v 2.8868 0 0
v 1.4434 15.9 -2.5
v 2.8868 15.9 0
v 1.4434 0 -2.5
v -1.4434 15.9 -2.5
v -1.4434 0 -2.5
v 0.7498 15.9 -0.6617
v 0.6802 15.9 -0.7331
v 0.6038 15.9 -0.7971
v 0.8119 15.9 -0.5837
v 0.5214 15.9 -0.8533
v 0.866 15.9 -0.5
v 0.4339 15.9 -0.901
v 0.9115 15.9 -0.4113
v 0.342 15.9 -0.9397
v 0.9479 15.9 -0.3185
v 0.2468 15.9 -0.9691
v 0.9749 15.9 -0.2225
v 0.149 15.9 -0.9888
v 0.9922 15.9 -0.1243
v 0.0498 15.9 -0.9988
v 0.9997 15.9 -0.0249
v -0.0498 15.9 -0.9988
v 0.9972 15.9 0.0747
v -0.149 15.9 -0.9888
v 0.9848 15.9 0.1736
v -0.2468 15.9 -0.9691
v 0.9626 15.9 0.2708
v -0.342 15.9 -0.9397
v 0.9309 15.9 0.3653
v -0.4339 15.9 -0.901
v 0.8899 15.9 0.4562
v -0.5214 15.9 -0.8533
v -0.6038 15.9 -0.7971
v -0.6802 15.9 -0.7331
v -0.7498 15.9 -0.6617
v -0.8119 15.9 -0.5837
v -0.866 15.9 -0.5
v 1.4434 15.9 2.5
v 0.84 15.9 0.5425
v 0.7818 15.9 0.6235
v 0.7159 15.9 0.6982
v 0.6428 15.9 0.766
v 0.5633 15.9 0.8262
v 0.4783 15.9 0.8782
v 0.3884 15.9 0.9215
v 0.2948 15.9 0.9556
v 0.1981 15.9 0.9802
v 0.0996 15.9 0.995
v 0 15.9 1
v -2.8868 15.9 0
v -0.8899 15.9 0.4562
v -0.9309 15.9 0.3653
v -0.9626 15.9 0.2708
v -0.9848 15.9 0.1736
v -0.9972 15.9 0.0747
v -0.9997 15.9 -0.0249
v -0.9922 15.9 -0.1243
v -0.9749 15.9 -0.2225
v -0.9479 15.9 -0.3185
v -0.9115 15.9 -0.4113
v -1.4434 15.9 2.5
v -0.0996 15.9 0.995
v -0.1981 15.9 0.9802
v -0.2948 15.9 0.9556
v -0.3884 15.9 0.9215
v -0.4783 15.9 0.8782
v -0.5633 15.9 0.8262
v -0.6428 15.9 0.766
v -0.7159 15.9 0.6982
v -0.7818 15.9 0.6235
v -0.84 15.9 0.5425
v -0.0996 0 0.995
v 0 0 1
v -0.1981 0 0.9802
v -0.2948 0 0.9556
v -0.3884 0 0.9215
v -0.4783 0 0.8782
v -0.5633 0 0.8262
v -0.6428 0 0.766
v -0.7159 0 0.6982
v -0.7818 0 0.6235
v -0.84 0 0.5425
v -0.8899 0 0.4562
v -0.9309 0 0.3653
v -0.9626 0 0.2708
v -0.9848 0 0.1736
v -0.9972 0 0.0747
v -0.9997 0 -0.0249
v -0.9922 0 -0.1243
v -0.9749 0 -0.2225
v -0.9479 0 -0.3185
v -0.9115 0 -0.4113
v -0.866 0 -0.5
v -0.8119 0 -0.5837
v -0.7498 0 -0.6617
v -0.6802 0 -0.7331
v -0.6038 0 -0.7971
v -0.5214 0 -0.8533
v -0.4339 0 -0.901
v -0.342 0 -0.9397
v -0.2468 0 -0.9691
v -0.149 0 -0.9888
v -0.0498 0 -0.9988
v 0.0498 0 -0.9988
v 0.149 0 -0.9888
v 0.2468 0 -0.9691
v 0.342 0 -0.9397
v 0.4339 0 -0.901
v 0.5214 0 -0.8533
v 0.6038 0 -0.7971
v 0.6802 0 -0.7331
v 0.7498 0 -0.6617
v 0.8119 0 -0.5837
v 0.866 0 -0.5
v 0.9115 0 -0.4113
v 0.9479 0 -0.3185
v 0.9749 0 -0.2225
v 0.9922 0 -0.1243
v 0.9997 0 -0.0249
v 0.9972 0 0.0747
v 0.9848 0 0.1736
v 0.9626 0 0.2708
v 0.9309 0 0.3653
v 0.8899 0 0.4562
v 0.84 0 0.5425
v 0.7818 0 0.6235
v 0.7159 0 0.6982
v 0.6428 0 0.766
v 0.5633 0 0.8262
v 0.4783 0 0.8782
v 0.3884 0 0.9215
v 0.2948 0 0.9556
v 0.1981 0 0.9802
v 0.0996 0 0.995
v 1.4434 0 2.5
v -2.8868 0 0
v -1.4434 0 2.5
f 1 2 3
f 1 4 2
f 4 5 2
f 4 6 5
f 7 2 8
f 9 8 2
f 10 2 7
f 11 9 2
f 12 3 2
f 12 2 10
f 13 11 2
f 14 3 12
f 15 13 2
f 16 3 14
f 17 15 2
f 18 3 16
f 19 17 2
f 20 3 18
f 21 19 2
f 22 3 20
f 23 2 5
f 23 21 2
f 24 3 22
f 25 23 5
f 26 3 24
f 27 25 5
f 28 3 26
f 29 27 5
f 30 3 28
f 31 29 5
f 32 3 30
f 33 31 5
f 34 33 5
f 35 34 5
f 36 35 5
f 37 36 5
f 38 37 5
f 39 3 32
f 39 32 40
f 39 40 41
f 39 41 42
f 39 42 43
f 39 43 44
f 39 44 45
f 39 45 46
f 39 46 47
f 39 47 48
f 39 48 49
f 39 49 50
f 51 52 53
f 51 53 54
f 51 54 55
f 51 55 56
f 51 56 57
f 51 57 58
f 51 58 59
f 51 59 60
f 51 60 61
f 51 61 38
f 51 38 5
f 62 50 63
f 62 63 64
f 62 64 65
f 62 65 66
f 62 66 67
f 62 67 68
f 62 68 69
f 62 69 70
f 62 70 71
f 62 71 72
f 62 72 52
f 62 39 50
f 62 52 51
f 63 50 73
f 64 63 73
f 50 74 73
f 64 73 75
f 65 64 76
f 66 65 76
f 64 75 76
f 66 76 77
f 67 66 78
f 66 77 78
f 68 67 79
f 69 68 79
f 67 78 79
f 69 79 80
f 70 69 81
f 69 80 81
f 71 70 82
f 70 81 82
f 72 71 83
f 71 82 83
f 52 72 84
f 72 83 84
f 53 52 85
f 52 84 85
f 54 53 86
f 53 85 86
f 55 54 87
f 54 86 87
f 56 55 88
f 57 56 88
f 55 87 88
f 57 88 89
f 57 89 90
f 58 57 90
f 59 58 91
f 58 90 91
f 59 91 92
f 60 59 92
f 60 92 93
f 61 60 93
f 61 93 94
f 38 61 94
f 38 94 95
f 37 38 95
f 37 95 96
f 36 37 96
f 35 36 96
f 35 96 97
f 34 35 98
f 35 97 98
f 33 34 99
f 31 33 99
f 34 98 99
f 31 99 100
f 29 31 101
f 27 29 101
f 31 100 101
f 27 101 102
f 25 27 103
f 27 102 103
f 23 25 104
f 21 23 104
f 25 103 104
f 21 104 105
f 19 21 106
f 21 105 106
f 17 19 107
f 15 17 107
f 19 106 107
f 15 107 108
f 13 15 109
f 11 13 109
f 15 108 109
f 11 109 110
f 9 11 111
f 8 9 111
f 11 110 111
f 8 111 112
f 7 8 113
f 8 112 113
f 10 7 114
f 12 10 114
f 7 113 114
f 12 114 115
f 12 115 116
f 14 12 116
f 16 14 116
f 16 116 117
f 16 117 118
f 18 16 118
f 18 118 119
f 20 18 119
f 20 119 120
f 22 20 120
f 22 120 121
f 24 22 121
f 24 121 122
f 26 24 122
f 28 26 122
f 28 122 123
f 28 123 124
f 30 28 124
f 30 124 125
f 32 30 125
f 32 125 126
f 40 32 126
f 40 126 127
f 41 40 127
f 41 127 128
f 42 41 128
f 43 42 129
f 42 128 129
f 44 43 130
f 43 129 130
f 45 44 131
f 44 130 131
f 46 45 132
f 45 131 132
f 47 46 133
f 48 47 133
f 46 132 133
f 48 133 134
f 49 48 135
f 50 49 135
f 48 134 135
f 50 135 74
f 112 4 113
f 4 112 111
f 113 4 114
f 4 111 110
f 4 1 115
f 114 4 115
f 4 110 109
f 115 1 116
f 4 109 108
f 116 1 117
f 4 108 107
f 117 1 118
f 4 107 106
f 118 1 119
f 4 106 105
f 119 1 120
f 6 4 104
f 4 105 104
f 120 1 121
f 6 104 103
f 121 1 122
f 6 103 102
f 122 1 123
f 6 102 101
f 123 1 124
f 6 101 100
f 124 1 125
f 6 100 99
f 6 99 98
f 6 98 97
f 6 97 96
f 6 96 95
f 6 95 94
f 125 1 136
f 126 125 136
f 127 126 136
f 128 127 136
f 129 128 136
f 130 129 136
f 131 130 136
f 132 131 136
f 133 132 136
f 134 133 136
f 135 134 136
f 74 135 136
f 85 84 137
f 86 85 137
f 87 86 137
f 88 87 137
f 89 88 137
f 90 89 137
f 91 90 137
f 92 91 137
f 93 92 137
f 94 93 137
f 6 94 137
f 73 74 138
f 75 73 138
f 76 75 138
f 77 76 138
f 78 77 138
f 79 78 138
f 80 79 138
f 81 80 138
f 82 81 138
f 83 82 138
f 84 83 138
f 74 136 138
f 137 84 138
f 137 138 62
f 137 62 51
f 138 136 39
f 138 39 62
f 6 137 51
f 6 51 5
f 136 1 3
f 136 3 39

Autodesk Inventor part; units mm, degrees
ref_plane "YZ Plane" through (0, 0, 0) normal (1, 0, 0) x (0, 1, 0)
ref_plane "XZ Plane" through (0, 0, 0) normal (0, 1, 0) x (-1, 0, 0)
ref_plane "XY Plane" through (0, 0, 0) normal (0, 0, 1) x (1, 0, 0)
sketch "Эскиз1" plane through (0, 0, 0) normal (0, 1, 0) x (-1, 0, 0)
  line L0 (1.4434, 2.5) -> (2.8868, 0)
  line L1 (2.8868, 0) -> (1.4434, -2.5)
  line L2 (1.4434, -2.5) -> (-1.4434, -2.5)
  line L3 (-1.4434, -2.5) -> (-2.8868, 0)
  line L4 (-2.8868, 0) -> (-1.4434, 2.5)
  line L5 (-1.4434, 2.5) -> (1.4434, 2.5)
  point P0 (0, 0)
  point P1 (0, 0)
  dimension "d0" = 5
extrude "Выдавливание1" add sketch "Эскиз1" along normal blind 15.9
sketch "Эскиз2" plane through (0, 15.9, 0) normal (0, 1, 0) x (1, 0, 0)
  line L0 (1.4434, 2.5) -> (-1.4434, 2.5) projected
  line L1 (-1.4434, 2.5) -> (-2.8868, 0) projected
  line L2 (-2.8868, 0) -> (-1.4434, -2.5) projected
  line L3 (-1.4434, -2.5) -> (1.4434, -2.5) projected
  line L4 (1.4434, -2.5) -> (2.8868, 0) projected
  line L5 (2.8868, 0) -> (1.4434, 2.5) projected
  point P0 (0, 0)
hole "Отверстие1" at (0, 15.9, 0) direction (0, -1, 0) diameter 2 end through all
properties part number "Проставка для стойки RPLIDAR"
